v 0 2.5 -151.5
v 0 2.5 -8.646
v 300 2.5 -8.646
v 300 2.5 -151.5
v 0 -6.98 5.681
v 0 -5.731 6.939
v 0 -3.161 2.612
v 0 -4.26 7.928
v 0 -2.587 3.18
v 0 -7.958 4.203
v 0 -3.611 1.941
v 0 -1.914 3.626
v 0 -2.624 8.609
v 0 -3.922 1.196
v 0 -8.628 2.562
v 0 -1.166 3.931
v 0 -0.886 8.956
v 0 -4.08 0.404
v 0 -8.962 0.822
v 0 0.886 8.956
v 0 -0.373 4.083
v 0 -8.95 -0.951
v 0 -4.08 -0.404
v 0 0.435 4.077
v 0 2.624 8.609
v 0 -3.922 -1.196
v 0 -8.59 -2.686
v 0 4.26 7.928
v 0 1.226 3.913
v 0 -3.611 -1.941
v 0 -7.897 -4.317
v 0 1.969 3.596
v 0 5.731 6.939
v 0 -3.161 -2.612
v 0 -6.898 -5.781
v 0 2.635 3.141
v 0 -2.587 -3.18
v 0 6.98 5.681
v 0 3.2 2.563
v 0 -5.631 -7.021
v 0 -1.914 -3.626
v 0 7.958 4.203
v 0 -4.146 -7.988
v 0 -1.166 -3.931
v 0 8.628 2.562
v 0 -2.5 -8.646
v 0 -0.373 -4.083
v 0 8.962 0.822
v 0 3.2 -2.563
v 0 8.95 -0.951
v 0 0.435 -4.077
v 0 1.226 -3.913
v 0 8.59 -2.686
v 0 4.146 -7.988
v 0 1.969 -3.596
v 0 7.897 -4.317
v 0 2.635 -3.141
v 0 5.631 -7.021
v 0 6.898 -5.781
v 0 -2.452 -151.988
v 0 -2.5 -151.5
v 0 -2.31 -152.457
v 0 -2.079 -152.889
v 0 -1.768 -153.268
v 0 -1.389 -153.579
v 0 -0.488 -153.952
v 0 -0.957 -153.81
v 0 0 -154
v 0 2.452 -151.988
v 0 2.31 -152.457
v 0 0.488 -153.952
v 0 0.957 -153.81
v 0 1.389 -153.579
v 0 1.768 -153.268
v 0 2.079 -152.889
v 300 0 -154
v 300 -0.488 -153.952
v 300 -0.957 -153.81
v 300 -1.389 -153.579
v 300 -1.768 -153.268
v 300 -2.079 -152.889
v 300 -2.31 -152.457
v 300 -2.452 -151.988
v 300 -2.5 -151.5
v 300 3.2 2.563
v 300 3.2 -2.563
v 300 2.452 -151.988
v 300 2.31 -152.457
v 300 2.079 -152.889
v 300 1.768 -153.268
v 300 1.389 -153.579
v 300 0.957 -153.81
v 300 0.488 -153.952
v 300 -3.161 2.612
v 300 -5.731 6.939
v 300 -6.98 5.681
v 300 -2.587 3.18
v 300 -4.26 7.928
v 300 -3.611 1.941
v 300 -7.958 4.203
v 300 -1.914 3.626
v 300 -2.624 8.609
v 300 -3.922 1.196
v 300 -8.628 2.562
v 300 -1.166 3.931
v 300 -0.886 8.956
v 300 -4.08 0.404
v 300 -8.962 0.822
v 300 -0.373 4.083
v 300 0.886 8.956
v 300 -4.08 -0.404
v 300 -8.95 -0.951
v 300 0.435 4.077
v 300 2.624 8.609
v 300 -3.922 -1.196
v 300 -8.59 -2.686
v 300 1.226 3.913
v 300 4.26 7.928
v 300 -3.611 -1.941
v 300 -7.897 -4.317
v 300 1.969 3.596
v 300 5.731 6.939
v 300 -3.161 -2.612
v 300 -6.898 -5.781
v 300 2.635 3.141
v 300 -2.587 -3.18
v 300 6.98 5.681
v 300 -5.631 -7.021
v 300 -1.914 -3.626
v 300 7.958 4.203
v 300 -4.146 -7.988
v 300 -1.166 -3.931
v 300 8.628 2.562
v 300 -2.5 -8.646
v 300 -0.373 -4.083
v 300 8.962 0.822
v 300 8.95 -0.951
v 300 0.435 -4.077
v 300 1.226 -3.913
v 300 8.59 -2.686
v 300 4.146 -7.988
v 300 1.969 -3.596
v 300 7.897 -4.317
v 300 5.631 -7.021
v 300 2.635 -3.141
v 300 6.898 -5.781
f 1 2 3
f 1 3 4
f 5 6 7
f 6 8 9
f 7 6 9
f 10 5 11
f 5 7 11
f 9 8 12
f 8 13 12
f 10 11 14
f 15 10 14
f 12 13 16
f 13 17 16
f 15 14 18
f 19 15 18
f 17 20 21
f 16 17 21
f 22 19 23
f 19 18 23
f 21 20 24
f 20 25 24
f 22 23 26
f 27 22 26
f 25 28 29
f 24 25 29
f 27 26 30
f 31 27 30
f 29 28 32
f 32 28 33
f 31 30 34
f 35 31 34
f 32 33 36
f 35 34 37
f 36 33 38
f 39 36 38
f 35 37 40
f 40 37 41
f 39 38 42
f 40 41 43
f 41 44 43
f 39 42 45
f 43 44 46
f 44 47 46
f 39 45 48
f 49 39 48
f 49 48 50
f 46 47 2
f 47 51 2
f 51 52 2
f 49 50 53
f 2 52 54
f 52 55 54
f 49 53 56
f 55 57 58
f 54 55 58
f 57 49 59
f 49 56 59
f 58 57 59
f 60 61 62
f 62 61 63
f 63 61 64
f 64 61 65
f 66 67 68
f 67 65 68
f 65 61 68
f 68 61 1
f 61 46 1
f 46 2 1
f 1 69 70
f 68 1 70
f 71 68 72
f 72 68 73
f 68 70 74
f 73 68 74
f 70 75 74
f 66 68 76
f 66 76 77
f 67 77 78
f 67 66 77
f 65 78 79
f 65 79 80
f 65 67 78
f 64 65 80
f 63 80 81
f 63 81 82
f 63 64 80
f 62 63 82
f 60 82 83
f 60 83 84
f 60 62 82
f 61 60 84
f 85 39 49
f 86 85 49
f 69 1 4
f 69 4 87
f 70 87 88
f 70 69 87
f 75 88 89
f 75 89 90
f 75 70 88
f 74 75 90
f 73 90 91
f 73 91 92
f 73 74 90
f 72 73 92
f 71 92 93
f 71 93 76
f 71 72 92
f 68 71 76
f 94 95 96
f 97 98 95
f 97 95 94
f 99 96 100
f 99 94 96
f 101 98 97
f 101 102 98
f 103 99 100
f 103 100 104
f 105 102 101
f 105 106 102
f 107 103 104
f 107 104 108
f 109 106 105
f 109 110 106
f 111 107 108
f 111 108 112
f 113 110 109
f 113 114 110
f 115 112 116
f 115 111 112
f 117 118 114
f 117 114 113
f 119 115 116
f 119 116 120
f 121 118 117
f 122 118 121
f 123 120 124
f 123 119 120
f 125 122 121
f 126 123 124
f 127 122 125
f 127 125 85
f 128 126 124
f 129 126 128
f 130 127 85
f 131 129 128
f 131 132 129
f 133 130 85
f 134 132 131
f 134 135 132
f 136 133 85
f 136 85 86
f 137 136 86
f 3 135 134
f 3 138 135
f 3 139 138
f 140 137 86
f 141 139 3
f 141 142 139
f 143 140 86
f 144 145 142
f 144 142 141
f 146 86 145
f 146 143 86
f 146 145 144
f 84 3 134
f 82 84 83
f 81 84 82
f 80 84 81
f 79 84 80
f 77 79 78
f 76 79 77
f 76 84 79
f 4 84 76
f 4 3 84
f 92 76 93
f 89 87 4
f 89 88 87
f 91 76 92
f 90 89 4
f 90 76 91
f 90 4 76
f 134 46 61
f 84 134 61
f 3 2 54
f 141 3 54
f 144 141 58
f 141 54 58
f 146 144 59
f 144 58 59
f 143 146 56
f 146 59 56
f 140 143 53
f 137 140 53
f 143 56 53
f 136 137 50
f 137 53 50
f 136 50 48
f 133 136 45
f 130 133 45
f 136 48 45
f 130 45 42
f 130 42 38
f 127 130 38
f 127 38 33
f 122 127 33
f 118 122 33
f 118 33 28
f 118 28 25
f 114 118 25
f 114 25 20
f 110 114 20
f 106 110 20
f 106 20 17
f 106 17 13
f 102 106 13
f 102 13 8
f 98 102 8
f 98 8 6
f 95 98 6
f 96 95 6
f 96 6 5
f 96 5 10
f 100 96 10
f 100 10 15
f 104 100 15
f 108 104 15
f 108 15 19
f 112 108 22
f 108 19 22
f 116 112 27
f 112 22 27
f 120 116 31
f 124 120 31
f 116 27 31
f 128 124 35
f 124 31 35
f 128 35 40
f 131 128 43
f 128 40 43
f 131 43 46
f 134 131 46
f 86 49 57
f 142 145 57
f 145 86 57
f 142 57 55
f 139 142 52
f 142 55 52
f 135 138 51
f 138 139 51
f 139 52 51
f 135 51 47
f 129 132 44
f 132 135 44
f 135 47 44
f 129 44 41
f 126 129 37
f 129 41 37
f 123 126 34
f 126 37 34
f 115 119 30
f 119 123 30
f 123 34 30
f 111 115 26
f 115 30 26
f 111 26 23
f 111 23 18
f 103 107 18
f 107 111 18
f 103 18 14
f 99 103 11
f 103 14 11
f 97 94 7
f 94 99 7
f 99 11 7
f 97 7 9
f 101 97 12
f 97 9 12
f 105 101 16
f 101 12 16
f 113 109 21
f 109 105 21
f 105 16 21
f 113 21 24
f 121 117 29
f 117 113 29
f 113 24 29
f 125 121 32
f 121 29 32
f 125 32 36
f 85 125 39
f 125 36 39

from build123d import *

# Parameters (mm, degrees)
SKETCH1_R               = 9
BOSS_EXTRUDE1_DEPTH     = 300
CUT_EXTRUDE1_DEPTH      = 301.269878609
CUT_EXTRUDE1_DEPTH_BACK = 301.269878609
SKETCH3_W               = 149.9
SKETCH3_H               = 5
BOSS_EXTRUDE2_DEPTH     = 300
CUT_EXTRUDE2_DEPTH      = 338.338109321
CUT_EXTRUDE2_DEPTH_BACK = 338.338109321


with BuildPart() as part:
    # Sketch1 → Boss-Extrude1 (new body)
    with BuildSketch(Plane(origin=(0, 0, 0), x_dir=(0, 0, -1), z_dir=(1, 0, 0))):
        Circle(SKETCH1_R)
    extrude(amount=BOSS_EXTRUDE1_DEPTH)

    # Sketch2 → Cut-Extrude1 (cut, two sides: drawn at the far end of the back side and taken through both)
    with BuildSketch(Plane(origin=(300, 0, 0), x_dir=(0, 0, -1), z_dir=(1, 0, 0)).offset(-CUT_EXTRUDE1_DEPTH_BACK)):
        with BuildLine():
            Line((-2.563201124, 3.2), (2.563201124, 3.2))
            ThreePointArc((2.563201124, 3.2), (0, -4.1), (-2.563201124, 3.2))
        make_face()
    extrude(amount=CUT_EXTRUDE1_DEPTH + CUT_EXTRUDE1_DEPTH_BACK, mode=Mode.SUBTRACT)

    # Sketch3 → Boss-Extrude2 (add)
    with BuildSketch(Plane(origin=(300, 0, 0), x_dir=(0, 0, -1), z_dir=(1, 0, 0))):
        with Locations((79.05, 0)):
            Rectangle(SKETCH3_W, SKETCH3_H)
    extrude(amount=-BOSS_EXTRUDE2_DEPTH)

    # Sketch4 → Cut-Extrude2 (cut, two sides: drawn at the far end of the back side and taken through both)
    with BuildSketch(Plane(origin=(300, 0, 0), x_dir=(0, 0, -1), z_dir=(1, 0, 0)).offset(-CUT_EXTRUDE2_DEPTH_BACK)):
        with BuildLine():
            Line((154, 2.5), (151.5, 2.5))
            ThreePointArc((151.5, 2.5), (153.267766953, 1.767766953), (154, 0))
            Line((154, 0), (154, 2.5))
        make_face()
        with BuildLine():
            Line((154, -2.5), (154, 0))
            ThreePointArc((154, 0), (153.267766953, -1.767766953), (151.5, -2.5))
            Line((151.5, -2.5), (154, -2.5))
        make_face()
    extrude(amount=CUT_EXTRUDE2_DEPTH + CUT_EXTRUDE2_DEPTH_BACK, mode=Mode.SUBTRACT)


solid = part.part
